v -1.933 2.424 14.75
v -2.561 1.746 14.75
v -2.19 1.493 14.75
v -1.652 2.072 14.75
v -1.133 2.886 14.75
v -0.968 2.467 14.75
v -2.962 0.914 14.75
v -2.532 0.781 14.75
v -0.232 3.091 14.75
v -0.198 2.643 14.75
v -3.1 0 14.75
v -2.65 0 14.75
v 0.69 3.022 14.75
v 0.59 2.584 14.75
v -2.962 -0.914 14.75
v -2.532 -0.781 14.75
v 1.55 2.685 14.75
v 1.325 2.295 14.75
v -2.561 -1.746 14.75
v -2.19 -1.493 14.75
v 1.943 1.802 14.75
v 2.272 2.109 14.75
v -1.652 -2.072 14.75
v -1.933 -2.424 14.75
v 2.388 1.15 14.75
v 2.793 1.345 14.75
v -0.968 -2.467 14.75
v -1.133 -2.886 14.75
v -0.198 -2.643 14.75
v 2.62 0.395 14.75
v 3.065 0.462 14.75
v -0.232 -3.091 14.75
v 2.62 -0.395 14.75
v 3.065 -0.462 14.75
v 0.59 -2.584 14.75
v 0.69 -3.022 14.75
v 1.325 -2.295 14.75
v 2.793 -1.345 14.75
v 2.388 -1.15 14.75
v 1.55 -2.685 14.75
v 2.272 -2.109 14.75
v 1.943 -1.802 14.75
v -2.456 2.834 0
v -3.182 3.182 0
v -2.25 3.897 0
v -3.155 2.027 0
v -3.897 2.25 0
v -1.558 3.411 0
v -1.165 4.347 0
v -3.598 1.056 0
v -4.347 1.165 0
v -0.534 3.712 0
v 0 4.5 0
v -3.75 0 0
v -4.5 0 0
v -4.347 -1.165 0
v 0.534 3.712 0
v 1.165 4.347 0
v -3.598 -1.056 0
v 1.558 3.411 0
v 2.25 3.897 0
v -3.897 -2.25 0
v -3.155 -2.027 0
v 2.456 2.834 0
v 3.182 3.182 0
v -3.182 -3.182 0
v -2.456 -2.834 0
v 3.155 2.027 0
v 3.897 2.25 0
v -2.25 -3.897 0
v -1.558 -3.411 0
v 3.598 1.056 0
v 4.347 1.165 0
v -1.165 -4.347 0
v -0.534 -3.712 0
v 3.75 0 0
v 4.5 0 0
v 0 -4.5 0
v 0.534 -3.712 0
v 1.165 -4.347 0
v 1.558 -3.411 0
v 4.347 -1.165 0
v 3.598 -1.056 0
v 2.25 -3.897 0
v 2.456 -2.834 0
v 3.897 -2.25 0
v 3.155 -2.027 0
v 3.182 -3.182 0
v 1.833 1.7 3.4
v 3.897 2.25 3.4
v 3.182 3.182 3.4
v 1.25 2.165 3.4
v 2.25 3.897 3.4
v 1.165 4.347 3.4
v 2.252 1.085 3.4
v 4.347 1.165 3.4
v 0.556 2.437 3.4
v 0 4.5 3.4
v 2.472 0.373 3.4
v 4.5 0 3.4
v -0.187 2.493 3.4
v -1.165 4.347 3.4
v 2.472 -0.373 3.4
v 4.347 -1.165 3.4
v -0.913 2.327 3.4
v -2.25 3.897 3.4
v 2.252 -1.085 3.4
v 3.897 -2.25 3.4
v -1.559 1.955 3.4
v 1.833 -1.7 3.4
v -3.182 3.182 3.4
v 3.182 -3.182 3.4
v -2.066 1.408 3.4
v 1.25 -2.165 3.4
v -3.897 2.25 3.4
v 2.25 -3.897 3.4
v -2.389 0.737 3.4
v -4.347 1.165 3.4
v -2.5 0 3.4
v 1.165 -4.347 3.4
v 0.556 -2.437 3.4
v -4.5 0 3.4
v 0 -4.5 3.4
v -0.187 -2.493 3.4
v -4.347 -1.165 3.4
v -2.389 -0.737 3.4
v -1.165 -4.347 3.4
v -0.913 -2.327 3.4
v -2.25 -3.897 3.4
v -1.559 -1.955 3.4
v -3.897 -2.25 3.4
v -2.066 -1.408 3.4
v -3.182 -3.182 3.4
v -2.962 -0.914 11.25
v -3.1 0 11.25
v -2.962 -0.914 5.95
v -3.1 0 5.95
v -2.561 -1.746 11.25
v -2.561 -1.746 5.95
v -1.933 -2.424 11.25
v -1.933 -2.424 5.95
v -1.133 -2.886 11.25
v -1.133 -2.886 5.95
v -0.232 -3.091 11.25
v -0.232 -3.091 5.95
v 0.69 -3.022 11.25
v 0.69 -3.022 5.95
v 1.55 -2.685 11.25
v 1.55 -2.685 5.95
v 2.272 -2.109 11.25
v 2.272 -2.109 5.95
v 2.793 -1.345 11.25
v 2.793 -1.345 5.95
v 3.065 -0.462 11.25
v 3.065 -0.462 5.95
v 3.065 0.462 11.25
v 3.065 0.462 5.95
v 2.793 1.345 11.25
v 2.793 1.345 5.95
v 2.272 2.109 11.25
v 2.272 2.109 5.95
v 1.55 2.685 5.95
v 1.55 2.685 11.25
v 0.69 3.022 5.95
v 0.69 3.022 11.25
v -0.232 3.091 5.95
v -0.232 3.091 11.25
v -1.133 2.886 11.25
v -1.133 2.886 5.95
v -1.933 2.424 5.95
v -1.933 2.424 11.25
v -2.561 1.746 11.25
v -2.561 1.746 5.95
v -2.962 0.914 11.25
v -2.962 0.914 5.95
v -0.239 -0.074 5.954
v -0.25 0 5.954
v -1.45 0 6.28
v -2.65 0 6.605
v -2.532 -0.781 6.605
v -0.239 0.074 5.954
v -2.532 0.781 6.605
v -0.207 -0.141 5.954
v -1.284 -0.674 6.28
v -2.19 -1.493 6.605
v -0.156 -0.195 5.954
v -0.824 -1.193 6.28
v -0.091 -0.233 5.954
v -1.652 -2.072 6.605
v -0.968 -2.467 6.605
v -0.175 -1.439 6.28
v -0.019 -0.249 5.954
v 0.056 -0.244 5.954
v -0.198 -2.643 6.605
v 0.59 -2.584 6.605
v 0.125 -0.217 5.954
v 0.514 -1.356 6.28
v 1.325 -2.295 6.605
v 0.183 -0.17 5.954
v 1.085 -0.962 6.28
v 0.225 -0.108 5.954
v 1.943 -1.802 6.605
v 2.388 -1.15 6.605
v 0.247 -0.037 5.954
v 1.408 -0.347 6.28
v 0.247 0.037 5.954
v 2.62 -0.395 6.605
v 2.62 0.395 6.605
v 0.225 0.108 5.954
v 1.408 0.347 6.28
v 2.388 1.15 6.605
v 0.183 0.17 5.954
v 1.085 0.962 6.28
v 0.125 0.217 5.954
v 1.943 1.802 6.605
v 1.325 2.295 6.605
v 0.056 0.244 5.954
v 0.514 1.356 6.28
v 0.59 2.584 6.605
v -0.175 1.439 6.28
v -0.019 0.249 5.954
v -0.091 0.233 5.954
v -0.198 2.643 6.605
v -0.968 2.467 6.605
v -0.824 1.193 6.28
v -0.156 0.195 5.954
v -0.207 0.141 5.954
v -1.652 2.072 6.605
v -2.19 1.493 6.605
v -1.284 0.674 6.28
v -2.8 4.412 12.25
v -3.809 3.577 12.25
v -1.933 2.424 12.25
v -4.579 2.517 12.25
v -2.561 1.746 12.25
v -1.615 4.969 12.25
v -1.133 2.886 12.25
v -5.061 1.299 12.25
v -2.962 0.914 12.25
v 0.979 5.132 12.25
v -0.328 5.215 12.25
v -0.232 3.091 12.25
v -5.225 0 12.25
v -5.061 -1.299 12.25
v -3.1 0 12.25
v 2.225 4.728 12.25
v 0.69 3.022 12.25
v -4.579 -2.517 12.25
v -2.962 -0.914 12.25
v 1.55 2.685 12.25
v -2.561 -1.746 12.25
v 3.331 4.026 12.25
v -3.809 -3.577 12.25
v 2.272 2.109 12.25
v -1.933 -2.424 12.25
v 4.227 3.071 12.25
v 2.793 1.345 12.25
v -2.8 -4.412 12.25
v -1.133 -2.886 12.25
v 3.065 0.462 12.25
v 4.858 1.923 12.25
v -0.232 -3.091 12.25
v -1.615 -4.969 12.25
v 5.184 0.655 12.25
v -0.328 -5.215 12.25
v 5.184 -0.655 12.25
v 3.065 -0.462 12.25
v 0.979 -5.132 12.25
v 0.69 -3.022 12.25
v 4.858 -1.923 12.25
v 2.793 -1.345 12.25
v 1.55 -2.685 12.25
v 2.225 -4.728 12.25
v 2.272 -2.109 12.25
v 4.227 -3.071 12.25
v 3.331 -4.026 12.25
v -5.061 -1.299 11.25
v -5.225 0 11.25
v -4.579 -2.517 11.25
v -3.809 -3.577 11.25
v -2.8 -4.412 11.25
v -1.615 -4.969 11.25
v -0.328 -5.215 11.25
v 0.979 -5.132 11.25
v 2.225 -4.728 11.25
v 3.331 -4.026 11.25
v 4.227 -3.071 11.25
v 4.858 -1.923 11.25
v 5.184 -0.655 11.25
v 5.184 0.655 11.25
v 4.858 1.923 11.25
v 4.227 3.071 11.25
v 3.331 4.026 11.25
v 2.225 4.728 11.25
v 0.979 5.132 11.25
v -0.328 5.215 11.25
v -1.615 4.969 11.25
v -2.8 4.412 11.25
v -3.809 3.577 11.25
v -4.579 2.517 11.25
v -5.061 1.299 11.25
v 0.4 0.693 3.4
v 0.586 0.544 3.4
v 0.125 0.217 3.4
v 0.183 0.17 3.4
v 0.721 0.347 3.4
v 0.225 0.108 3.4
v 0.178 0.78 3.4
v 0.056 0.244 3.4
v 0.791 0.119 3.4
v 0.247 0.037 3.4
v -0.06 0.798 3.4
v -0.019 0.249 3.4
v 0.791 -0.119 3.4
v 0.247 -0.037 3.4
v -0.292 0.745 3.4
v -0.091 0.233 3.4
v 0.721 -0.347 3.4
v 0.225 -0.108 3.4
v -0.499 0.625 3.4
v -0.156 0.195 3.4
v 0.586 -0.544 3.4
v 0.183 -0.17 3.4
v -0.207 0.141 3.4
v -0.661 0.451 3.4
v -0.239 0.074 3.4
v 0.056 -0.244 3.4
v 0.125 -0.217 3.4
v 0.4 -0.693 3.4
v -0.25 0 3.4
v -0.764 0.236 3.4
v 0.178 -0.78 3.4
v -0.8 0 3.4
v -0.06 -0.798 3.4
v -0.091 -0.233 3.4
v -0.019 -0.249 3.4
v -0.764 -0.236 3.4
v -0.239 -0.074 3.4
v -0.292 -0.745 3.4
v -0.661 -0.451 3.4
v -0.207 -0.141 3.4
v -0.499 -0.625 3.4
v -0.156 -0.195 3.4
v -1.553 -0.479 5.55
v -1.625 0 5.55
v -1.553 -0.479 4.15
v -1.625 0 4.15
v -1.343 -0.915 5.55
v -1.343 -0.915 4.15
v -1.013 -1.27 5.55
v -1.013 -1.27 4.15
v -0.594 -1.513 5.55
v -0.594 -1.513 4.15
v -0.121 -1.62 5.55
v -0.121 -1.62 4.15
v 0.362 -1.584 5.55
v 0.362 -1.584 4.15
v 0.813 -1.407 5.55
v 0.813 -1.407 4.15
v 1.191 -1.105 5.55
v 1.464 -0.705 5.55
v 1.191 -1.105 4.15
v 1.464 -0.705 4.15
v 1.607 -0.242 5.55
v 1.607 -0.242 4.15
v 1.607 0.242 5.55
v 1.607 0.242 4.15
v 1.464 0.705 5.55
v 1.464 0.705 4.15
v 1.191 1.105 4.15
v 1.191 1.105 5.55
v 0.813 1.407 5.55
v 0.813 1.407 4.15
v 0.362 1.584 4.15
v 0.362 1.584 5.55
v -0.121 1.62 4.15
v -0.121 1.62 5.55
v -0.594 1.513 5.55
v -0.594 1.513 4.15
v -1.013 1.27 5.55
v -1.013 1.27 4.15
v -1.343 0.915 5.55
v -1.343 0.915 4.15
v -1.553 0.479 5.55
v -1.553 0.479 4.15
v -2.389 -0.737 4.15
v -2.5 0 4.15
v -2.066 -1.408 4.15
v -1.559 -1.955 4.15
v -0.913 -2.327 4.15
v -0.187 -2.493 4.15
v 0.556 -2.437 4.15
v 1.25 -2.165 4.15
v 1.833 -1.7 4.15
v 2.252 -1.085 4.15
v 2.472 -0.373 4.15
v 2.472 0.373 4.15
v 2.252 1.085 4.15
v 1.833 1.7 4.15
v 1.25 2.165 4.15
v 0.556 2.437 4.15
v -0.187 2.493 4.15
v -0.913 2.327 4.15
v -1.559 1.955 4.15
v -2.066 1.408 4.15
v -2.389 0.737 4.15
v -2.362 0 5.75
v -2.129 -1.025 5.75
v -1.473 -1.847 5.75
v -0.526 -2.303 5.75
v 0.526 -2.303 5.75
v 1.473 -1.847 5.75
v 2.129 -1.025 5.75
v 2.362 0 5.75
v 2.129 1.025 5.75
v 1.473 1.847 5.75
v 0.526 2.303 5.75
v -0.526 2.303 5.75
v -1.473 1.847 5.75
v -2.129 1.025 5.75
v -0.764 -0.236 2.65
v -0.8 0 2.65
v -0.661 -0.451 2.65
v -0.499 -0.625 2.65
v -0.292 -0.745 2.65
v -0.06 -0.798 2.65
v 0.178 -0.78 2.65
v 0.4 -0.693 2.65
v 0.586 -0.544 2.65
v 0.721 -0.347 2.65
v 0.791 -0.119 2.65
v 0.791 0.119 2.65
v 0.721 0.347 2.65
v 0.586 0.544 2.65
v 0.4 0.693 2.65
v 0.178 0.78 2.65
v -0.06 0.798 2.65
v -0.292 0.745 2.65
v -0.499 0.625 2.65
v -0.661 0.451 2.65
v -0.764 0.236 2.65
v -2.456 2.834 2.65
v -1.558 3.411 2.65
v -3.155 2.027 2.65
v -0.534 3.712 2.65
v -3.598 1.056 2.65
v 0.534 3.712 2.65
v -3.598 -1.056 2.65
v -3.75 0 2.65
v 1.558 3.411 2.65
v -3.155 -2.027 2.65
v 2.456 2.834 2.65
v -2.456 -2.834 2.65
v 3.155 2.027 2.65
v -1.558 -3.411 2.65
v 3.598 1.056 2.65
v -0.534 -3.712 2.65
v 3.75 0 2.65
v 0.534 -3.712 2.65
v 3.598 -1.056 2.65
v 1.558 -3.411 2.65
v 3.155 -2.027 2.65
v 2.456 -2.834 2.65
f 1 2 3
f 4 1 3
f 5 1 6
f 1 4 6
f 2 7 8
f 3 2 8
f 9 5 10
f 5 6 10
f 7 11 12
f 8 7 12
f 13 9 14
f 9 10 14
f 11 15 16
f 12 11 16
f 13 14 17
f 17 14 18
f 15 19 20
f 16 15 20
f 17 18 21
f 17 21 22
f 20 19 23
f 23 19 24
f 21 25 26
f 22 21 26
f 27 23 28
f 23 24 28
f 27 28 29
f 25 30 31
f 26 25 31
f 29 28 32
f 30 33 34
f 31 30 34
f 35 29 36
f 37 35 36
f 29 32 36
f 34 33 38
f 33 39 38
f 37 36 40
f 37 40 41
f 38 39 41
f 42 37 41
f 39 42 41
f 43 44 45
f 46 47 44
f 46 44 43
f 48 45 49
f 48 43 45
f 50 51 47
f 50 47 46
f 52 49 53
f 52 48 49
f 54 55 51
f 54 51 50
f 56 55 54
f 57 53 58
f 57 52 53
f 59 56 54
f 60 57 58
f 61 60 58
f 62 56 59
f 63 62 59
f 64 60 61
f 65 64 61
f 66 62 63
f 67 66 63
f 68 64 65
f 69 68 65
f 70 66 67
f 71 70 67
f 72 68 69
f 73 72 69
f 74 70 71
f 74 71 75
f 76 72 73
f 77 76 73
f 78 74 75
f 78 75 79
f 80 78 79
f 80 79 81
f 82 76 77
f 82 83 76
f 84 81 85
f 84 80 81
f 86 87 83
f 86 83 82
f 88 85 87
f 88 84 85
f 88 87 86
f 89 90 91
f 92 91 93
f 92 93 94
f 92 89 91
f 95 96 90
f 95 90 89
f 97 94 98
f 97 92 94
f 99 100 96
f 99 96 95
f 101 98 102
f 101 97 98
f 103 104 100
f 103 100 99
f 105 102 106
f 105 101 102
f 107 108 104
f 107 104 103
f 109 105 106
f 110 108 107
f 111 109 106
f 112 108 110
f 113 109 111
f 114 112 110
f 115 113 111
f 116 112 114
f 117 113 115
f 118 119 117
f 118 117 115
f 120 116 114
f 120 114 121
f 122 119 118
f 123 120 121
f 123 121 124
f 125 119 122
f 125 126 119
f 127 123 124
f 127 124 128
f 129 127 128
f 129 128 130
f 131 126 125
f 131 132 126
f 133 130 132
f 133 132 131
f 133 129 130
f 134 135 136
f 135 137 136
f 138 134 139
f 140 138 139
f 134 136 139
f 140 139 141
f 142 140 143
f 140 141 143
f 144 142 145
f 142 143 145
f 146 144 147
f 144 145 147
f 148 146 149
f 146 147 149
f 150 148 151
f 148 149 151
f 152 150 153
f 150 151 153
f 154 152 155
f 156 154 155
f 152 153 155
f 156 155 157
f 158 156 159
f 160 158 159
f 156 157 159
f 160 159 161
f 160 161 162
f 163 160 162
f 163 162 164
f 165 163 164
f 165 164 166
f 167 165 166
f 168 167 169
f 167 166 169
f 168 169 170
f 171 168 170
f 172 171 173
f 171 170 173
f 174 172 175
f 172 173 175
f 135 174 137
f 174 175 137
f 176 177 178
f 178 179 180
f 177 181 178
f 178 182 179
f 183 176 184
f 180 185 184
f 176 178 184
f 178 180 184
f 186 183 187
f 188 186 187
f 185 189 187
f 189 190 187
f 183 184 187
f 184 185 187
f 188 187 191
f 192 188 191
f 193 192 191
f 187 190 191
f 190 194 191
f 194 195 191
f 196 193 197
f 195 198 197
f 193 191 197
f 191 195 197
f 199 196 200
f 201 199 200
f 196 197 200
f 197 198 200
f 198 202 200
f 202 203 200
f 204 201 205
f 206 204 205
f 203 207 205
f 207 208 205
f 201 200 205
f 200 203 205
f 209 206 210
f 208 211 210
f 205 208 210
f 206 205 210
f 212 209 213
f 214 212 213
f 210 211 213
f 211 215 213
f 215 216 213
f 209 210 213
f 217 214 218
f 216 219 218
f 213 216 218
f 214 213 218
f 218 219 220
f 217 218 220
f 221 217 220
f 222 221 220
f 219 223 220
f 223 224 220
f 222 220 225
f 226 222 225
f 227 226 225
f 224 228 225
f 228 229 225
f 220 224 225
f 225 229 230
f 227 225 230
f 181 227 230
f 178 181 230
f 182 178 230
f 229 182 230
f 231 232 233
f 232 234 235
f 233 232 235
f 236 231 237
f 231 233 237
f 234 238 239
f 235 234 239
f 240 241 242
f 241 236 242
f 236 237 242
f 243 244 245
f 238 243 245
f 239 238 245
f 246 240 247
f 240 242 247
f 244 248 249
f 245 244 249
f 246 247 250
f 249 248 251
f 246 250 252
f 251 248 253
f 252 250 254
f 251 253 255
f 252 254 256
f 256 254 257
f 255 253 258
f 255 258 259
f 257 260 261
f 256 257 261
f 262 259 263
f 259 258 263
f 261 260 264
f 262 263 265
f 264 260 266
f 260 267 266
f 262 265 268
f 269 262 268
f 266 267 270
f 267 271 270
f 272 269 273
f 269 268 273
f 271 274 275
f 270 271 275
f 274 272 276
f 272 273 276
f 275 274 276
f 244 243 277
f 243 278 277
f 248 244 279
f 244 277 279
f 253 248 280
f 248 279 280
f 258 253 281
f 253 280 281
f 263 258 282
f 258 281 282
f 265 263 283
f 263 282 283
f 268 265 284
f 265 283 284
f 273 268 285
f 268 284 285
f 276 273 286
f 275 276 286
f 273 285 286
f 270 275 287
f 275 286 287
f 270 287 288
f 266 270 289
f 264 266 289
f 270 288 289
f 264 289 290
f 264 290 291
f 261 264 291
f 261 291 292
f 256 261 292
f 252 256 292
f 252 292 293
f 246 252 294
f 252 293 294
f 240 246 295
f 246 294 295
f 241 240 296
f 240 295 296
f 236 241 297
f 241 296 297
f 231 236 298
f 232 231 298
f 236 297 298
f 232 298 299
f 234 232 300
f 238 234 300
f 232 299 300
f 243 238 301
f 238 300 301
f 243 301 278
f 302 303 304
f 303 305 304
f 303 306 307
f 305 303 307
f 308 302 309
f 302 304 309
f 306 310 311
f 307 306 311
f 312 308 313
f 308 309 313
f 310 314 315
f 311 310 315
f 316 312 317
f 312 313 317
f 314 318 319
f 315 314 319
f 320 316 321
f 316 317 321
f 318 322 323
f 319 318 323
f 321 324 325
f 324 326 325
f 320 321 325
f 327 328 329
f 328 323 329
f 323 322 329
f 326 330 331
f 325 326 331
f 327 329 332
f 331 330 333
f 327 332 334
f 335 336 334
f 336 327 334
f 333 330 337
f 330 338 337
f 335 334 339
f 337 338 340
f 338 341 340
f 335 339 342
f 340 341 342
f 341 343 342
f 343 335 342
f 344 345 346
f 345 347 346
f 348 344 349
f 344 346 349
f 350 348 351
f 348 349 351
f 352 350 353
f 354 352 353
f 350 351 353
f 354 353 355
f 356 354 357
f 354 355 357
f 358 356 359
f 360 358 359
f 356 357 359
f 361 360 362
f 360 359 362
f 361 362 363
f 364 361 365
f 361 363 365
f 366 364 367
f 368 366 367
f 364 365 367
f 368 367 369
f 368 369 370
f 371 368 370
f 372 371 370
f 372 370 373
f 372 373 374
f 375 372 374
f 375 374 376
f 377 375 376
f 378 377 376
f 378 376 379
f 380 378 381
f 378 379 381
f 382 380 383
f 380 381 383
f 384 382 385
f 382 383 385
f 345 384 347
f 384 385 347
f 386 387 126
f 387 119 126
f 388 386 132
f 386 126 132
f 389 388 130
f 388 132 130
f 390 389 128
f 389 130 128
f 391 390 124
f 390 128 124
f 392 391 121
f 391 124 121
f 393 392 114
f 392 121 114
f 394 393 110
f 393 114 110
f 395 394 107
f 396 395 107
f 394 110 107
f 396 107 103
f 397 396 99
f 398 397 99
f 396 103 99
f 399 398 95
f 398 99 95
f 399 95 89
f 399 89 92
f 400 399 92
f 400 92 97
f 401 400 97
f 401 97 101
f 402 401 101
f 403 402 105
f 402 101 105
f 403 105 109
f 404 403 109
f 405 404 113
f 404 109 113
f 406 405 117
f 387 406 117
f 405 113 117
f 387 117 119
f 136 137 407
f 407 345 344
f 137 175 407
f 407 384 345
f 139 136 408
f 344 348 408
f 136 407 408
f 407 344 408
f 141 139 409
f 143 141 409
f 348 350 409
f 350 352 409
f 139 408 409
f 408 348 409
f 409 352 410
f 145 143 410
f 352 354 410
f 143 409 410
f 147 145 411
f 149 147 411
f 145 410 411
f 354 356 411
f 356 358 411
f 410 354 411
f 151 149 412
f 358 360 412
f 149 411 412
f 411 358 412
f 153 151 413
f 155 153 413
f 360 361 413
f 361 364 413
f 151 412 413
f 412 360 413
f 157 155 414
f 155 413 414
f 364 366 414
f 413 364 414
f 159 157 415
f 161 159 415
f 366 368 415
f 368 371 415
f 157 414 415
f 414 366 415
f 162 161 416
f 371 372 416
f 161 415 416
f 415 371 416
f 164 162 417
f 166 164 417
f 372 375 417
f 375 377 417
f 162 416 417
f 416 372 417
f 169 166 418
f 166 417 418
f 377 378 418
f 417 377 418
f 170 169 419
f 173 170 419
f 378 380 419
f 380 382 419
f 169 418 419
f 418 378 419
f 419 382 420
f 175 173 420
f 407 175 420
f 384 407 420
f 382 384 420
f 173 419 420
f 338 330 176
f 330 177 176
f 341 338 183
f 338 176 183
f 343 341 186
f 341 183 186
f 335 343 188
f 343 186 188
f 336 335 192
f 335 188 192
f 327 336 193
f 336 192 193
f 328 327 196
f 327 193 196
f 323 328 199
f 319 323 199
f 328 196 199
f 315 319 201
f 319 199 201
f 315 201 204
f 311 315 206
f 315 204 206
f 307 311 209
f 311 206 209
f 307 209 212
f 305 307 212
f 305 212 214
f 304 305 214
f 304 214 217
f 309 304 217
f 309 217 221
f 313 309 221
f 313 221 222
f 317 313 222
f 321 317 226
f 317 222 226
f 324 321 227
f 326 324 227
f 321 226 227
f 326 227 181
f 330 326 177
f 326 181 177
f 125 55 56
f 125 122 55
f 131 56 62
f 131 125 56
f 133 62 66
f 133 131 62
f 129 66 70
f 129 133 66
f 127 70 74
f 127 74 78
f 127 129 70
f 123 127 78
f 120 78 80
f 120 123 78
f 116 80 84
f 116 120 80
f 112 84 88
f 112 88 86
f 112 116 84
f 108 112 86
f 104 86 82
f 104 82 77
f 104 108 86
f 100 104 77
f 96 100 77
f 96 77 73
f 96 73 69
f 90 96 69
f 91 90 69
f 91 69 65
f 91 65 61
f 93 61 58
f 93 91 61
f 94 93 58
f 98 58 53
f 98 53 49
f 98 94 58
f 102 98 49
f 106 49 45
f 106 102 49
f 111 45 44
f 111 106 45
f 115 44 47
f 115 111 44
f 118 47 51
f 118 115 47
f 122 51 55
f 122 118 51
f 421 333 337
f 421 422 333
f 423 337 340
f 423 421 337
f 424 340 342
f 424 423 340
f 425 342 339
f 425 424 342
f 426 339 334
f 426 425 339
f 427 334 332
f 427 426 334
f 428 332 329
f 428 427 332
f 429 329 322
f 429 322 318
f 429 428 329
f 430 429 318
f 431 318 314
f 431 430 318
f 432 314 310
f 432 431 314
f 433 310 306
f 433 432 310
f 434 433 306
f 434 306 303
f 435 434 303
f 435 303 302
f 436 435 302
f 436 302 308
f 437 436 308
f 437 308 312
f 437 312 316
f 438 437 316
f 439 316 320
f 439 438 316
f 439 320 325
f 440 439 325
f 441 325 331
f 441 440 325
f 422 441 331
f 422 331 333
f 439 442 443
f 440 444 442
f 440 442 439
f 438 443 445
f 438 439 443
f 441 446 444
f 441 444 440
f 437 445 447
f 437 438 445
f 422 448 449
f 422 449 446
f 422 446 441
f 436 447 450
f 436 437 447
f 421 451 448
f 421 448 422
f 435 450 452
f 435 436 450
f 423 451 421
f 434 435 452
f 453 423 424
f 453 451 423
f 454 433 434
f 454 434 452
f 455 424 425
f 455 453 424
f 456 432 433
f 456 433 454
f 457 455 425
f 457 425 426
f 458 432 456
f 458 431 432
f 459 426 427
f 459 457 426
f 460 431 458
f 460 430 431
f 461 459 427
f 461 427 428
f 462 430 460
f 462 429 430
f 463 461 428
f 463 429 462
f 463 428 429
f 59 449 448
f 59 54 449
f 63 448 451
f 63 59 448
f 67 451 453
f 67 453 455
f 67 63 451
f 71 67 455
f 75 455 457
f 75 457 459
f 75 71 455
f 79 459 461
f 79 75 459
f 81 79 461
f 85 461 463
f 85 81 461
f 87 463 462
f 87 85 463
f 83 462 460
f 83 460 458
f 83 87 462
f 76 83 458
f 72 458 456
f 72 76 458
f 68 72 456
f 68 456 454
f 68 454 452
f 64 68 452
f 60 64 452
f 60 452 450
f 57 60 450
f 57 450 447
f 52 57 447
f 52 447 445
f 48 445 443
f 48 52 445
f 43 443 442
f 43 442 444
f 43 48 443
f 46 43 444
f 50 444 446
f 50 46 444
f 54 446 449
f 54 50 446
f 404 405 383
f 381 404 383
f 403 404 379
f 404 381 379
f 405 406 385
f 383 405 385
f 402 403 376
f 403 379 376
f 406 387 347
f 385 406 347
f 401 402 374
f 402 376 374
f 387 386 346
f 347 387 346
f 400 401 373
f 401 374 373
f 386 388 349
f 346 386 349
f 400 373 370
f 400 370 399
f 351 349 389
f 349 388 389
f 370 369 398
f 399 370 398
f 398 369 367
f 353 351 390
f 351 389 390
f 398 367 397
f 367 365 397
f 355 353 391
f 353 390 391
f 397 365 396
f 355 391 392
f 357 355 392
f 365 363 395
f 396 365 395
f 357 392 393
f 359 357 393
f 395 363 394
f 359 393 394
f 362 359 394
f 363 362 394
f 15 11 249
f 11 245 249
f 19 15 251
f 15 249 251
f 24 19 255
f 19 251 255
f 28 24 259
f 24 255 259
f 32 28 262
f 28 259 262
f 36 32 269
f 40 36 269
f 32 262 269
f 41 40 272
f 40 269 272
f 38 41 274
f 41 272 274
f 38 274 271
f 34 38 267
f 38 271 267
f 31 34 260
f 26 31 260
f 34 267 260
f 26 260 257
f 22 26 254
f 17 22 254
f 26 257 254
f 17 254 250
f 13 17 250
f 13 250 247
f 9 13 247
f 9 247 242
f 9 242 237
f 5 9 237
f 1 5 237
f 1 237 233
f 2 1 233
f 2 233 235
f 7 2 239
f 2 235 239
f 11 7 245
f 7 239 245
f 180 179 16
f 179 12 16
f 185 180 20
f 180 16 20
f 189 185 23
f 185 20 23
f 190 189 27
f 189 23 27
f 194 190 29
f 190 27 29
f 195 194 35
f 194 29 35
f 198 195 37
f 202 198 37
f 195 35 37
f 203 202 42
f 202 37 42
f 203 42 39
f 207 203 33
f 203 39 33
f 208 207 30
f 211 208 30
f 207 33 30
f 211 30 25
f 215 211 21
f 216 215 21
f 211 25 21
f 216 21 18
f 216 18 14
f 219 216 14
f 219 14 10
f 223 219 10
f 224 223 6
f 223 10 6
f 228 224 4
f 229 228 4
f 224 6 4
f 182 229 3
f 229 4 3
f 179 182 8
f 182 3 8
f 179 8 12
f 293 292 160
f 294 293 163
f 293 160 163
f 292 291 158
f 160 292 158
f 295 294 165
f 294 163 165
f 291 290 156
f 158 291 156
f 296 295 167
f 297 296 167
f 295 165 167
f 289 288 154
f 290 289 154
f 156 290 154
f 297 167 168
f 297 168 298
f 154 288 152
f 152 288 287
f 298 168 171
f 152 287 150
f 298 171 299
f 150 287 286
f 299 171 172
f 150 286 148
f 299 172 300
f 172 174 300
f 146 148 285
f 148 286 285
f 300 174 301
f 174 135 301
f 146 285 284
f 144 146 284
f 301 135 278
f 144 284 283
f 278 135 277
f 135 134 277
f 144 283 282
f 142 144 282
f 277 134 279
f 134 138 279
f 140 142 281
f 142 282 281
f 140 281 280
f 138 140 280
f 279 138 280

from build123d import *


with BuildPart() as part:
    # Body Sketch → Body Revolve (revolve)
    with BuildSketch(Plane(origin=(0, 0, 0), x_dir=(1, 0, 0), z_dir=(0, 1, 0)), mode=Mode.PRIVATE) as body_revolve_sk:
        Polygon((2.65, -14.75), (3.1, -14.75), (3.1, -12.25), (5.225, -12.25), (5.225, -11.25), (3.1, -11.25), (3.1, -5.95), (1.625, -5.55), (1.625, -4.15), (2.5, -4.15), (2.5, -3.4), (0.25, -3.4), (0.25, -5.954207714), (2.65, -6.605055172), align=None)
    revolve(body_revolve_sk.sketch.rotate(Axis((0, 0, 0), (0, 0, 1)), 180), axis=Axis((0, 0, 0), (0, 0, 1)))

    # N75 Sketch → N75 Revolve (revolve)
    with BuildSketch(Plane(origin=(0, 0, 0), x_dir=(1, 0, 0), z_dir=(0, 1, 0)), mode=Mode.PRIVATE) as n75_revolve_sk:
        Polygon((3.75, 0), (4.5, 0), (4.5, -3.4), (0.8, -3.4), (0.8, -2.65), (3.75, -2.65), align=None)
    revolve(n75_revolve_sk.sketch.rotate(Axis((0, 0, 0), (0, 0, 1)), 180), axis=Axis((0, 0, 0), (0, 0, 1)))


solid = part.part
